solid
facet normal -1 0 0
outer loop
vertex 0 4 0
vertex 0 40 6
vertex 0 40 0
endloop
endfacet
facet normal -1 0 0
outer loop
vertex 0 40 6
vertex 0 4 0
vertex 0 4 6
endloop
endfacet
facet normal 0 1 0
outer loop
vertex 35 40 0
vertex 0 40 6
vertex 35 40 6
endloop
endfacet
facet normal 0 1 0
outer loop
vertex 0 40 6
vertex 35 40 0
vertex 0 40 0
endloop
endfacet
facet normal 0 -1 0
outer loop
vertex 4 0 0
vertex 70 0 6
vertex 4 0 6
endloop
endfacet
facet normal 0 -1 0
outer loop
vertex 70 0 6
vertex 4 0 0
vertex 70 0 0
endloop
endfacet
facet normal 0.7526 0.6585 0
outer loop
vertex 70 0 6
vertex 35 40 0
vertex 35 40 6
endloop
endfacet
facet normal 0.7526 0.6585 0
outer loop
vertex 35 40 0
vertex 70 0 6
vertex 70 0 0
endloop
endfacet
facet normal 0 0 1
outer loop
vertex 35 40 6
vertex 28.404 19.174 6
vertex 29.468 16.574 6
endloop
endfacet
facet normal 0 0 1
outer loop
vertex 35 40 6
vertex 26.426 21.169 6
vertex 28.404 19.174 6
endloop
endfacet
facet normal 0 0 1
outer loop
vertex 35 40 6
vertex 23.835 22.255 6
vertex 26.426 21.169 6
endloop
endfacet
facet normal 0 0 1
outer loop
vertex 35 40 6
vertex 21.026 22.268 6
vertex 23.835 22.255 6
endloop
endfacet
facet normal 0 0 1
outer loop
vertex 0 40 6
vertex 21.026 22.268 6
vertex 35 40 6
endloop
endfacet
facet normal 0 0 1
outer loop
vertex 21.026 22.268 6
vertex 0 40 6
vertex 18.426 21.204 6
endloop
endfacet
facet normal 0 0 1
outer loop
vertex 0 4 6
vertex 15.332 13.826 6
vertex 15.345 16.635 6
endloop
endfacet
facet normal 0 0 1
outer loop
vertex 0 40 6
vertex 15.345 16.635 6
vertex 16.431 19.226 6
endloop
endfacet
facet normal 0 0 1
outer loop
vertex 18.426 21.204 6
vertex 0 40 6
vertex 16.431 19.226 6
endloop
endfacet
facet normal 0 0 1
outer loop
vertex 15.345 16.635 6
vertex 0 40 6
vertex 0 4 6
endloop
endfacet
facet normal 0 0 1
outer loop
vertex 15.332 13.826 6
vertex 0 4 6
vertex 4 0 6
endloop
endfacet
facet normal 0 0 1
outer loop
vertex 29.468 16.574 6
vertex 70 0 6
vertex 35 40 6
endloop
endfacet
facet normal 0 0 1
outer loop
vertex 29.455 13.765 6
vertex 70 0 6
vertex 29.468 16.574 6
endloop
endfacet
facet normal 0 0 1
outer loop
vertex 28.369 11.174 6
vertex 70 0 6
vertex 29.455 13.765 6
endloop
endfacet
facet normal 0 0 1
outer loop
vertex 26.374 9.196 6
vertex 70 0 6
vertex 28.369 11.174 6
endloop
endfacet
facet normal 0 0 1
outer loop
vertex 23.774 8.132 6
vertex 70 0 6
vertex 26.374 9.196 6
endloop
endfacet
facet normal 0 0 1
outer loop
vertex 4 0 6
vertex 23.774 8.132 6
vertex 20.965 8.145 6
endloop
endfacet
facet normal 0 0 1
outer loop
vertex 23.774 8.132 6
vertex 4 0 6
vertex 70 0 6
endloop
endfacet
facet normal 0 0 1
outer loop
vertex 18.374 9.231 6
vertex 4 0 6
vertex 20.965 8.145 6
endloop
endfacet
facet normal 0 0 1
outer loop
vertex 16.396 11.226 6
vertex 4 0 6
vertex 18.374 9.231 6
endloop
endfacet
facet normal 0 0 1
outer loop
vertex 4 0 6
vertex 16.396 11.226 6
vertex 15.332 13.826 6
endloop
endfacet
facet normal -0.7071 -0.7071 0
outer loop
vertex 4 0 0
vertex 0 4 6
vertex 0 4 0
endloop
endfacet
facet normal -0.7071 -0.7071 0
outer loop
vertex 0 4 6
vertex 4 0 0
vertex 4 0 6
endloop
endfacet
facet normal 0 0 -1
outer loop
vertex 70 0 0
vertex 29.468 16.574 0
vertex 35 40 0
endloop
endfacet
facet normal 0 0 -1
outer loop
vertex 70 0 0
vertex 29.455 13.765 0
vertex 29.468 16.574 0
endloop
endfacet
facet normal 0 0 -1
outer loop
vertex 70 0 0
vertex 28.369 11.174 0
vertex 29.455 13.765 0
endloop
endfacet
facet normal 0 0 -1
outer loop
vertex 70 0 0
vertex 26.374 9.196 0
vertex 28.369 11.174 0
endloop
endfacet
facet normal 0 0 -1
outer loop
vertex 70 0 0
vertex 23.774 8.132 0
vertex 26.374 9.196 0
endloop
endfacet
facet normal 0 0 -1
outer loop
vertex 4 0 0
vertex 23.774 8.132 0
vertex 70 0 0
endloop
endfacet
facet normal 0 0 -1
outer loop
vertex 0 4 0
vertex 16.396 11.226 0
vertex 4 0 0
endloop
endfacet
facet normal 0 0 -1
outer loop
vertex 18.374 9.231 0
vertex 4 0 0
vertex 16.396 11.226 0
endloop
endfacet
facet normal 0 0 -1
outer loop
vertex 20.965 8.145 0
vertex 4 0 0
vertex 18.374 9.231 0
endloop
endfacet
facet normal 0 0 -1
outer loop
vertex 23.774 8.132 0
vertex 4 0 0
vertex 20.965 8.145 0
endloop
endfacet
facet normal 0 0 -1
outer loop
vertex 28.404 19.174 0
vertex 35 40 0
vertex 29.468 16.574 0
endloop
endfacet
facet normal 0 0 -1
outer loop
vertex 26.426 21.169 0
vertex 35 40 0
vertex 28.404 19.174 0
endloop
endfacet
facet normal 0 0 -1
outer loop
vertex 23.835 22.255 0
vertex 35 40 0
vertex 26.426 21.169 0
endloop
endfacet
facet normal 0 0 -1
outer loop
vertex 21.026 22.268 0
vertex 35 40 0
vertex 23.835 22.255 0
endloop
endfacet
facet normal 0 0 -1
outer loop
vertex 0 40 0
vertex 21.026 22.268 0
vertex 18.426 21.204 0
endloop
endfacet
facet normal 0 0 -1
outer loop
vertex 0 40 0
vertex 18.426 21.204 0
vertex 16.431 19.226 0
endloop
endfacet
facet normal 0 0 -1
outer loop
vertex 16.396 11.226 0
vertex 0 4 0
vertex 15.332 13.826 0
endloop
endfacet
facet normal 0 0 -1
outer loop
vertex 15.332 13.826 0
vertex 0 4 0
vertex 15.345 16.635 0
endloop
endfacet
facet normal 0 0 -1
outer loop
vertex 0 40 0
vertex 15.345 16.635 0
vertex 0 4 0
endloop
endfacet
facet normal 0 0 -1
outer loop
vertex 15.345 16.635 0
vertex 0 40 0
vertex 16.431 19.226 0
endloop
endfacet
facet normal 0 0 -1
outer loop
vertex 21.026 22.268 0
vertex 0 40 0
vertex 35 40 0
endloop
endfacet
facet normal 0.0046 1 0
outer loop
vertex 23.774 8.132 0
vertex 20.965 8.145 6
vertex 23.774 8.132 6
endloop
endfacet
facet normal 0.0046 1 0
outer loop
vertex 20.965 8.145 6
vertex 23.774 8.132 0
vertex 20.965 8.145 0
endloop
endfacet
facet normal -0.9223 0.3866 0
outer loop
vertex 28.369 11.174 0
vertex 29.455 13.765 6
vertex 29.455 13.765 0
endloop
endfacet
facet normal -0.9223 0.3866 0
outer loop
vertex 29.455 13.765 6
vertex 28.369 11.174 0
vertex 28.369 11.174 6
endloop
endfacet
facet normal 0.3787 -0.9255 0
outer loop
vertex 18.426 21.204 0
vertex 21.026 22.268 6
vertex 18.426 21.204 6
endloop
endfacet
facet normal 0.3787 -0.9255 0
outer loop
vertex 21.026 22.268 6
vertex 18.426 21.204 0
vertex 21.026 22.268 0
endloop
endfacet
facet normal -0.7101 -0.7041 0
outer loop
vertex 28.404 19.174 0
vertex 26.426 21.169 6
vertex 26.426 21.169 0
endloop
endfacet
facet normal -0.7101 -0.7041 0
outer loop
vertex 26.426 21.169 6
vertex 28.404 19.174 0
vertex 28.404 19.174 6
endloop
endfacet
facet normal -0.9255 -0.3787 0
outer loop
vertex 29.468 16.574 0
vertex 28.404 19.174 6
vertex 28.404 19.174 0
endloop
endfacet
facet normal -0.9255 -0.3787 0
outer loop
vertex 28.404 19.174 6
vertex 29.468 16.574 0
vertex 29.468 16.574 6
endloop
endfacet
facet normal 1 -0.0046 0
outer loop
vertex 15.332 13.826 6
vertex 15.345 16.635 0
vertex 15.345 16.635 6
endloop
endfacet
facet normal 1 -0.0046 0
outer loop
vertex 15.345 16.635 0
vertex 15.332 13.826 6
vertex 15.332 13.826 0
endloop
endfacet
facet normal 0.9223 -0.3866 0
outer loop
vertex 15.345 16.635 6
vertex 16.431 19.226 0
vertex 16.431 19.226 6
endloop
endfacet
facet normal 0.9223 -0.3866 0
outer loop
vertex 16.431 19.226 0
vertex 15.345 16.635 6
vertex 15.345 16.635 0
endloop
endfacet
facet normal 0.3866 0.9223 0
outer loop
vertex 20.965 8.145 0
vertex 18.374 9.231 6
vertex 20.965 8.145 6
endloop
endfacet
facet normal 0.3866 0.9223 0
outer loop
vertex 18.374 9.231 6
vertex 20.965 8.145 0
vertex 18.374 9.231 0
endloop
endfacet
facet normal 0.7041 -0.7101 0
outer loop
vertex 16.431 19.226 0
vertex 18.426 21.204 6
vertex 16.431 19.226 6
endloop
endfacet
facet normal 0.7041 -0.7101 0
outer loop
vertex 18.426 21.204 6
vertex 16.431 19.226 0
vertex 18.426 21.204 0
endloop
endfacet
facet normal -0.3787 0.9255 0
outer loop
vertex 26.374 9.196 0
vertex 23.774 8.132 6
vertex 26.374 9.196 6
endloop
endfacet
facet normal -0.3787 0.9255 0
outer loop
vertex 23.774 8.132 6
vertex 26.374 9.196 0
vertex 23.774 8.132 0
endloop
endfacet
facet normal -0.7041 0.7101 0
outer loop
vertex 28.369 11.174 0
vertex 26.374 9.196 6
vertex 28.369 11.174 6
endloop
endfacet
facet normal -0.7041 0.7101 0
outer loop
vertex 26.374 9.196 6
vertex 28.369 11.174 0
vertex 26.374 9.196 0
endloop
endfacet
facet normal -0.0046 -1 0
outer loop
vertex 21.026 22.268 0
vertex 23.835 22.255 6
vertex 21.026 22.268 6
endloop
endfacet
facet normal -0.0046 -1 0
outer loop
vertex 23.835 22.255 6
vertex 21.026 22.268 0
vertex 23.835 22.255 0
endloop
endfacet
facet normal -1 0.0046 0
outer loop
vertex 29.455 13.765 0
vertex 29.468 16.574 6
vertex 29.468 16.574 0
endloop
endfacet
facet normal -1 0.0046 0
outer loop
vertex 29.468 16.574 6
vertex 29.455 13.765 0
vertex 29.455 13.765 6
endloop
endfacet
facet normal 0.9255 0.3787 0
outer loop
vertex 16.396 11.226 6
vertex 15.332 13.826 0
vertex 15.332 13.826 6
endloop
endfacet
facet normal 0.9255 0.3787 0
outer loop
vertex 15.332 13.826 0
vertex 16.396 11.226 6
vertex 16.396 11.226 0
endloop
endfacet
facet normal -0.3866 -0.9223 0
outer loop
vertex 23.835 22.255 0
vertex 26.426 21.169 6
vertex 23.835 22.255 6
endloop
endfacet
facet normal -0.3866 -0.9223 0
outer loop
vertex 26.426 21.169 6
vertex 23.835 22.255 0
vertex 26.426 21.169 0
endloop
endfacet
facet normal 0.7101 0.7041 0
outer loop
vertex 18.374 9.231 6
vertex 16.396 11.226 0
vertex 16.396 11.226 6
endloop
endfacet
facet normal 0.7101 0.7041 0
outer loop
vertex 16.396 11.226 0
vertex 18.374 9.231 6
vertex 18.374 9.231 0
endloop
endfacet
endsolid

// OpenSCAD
$fn = 32;

// ----------------------------------------------------------------------
// Bracket plate: gusset 70 x 40
// ----------------------------------------------------------------------

// --- parameters (mm) ---
hole_r = 4;               // bolt hole radius
plate_t = 6;              // plate thickness, Z (extrusion height)
gus_a = 70;               // base length
gus_b = 40;               // height
top_x = 35;               // top edge X of the angled cut
light_r = 7.2;            // lightening hole radius

light_d = 2 * light_r;

profile = [[4, 0], [35, 0], [70, 0], [35, 40], [0, 40], [0, 4]];  // primary outline, 6 points, counter clockwise
void_1 = [[29.468, 16.574], [28.404, 19.174], [26.426, 21.169], [23.835, 22.255], [21.026, 22.268], [18.426, 21.204], [16.431, 19.226], [15.345, 16.635], [15.332, 13.826], [16.396, 11.226], [18.374, 9.231], [20.965, 8.145], [23.774, 8.132], [26.374, 9.196], [28.369, 11.174], [29.455, 13.765]];  // lightening hole, 16 points

// --- the one profile operation ---
difference() {
  linear_extrude(height = plate_t) polygon(points = profile);
  translate([0, 0, -1])
    linear_extrude(height = plate_t + 2) polygon(points = void_1);
}
